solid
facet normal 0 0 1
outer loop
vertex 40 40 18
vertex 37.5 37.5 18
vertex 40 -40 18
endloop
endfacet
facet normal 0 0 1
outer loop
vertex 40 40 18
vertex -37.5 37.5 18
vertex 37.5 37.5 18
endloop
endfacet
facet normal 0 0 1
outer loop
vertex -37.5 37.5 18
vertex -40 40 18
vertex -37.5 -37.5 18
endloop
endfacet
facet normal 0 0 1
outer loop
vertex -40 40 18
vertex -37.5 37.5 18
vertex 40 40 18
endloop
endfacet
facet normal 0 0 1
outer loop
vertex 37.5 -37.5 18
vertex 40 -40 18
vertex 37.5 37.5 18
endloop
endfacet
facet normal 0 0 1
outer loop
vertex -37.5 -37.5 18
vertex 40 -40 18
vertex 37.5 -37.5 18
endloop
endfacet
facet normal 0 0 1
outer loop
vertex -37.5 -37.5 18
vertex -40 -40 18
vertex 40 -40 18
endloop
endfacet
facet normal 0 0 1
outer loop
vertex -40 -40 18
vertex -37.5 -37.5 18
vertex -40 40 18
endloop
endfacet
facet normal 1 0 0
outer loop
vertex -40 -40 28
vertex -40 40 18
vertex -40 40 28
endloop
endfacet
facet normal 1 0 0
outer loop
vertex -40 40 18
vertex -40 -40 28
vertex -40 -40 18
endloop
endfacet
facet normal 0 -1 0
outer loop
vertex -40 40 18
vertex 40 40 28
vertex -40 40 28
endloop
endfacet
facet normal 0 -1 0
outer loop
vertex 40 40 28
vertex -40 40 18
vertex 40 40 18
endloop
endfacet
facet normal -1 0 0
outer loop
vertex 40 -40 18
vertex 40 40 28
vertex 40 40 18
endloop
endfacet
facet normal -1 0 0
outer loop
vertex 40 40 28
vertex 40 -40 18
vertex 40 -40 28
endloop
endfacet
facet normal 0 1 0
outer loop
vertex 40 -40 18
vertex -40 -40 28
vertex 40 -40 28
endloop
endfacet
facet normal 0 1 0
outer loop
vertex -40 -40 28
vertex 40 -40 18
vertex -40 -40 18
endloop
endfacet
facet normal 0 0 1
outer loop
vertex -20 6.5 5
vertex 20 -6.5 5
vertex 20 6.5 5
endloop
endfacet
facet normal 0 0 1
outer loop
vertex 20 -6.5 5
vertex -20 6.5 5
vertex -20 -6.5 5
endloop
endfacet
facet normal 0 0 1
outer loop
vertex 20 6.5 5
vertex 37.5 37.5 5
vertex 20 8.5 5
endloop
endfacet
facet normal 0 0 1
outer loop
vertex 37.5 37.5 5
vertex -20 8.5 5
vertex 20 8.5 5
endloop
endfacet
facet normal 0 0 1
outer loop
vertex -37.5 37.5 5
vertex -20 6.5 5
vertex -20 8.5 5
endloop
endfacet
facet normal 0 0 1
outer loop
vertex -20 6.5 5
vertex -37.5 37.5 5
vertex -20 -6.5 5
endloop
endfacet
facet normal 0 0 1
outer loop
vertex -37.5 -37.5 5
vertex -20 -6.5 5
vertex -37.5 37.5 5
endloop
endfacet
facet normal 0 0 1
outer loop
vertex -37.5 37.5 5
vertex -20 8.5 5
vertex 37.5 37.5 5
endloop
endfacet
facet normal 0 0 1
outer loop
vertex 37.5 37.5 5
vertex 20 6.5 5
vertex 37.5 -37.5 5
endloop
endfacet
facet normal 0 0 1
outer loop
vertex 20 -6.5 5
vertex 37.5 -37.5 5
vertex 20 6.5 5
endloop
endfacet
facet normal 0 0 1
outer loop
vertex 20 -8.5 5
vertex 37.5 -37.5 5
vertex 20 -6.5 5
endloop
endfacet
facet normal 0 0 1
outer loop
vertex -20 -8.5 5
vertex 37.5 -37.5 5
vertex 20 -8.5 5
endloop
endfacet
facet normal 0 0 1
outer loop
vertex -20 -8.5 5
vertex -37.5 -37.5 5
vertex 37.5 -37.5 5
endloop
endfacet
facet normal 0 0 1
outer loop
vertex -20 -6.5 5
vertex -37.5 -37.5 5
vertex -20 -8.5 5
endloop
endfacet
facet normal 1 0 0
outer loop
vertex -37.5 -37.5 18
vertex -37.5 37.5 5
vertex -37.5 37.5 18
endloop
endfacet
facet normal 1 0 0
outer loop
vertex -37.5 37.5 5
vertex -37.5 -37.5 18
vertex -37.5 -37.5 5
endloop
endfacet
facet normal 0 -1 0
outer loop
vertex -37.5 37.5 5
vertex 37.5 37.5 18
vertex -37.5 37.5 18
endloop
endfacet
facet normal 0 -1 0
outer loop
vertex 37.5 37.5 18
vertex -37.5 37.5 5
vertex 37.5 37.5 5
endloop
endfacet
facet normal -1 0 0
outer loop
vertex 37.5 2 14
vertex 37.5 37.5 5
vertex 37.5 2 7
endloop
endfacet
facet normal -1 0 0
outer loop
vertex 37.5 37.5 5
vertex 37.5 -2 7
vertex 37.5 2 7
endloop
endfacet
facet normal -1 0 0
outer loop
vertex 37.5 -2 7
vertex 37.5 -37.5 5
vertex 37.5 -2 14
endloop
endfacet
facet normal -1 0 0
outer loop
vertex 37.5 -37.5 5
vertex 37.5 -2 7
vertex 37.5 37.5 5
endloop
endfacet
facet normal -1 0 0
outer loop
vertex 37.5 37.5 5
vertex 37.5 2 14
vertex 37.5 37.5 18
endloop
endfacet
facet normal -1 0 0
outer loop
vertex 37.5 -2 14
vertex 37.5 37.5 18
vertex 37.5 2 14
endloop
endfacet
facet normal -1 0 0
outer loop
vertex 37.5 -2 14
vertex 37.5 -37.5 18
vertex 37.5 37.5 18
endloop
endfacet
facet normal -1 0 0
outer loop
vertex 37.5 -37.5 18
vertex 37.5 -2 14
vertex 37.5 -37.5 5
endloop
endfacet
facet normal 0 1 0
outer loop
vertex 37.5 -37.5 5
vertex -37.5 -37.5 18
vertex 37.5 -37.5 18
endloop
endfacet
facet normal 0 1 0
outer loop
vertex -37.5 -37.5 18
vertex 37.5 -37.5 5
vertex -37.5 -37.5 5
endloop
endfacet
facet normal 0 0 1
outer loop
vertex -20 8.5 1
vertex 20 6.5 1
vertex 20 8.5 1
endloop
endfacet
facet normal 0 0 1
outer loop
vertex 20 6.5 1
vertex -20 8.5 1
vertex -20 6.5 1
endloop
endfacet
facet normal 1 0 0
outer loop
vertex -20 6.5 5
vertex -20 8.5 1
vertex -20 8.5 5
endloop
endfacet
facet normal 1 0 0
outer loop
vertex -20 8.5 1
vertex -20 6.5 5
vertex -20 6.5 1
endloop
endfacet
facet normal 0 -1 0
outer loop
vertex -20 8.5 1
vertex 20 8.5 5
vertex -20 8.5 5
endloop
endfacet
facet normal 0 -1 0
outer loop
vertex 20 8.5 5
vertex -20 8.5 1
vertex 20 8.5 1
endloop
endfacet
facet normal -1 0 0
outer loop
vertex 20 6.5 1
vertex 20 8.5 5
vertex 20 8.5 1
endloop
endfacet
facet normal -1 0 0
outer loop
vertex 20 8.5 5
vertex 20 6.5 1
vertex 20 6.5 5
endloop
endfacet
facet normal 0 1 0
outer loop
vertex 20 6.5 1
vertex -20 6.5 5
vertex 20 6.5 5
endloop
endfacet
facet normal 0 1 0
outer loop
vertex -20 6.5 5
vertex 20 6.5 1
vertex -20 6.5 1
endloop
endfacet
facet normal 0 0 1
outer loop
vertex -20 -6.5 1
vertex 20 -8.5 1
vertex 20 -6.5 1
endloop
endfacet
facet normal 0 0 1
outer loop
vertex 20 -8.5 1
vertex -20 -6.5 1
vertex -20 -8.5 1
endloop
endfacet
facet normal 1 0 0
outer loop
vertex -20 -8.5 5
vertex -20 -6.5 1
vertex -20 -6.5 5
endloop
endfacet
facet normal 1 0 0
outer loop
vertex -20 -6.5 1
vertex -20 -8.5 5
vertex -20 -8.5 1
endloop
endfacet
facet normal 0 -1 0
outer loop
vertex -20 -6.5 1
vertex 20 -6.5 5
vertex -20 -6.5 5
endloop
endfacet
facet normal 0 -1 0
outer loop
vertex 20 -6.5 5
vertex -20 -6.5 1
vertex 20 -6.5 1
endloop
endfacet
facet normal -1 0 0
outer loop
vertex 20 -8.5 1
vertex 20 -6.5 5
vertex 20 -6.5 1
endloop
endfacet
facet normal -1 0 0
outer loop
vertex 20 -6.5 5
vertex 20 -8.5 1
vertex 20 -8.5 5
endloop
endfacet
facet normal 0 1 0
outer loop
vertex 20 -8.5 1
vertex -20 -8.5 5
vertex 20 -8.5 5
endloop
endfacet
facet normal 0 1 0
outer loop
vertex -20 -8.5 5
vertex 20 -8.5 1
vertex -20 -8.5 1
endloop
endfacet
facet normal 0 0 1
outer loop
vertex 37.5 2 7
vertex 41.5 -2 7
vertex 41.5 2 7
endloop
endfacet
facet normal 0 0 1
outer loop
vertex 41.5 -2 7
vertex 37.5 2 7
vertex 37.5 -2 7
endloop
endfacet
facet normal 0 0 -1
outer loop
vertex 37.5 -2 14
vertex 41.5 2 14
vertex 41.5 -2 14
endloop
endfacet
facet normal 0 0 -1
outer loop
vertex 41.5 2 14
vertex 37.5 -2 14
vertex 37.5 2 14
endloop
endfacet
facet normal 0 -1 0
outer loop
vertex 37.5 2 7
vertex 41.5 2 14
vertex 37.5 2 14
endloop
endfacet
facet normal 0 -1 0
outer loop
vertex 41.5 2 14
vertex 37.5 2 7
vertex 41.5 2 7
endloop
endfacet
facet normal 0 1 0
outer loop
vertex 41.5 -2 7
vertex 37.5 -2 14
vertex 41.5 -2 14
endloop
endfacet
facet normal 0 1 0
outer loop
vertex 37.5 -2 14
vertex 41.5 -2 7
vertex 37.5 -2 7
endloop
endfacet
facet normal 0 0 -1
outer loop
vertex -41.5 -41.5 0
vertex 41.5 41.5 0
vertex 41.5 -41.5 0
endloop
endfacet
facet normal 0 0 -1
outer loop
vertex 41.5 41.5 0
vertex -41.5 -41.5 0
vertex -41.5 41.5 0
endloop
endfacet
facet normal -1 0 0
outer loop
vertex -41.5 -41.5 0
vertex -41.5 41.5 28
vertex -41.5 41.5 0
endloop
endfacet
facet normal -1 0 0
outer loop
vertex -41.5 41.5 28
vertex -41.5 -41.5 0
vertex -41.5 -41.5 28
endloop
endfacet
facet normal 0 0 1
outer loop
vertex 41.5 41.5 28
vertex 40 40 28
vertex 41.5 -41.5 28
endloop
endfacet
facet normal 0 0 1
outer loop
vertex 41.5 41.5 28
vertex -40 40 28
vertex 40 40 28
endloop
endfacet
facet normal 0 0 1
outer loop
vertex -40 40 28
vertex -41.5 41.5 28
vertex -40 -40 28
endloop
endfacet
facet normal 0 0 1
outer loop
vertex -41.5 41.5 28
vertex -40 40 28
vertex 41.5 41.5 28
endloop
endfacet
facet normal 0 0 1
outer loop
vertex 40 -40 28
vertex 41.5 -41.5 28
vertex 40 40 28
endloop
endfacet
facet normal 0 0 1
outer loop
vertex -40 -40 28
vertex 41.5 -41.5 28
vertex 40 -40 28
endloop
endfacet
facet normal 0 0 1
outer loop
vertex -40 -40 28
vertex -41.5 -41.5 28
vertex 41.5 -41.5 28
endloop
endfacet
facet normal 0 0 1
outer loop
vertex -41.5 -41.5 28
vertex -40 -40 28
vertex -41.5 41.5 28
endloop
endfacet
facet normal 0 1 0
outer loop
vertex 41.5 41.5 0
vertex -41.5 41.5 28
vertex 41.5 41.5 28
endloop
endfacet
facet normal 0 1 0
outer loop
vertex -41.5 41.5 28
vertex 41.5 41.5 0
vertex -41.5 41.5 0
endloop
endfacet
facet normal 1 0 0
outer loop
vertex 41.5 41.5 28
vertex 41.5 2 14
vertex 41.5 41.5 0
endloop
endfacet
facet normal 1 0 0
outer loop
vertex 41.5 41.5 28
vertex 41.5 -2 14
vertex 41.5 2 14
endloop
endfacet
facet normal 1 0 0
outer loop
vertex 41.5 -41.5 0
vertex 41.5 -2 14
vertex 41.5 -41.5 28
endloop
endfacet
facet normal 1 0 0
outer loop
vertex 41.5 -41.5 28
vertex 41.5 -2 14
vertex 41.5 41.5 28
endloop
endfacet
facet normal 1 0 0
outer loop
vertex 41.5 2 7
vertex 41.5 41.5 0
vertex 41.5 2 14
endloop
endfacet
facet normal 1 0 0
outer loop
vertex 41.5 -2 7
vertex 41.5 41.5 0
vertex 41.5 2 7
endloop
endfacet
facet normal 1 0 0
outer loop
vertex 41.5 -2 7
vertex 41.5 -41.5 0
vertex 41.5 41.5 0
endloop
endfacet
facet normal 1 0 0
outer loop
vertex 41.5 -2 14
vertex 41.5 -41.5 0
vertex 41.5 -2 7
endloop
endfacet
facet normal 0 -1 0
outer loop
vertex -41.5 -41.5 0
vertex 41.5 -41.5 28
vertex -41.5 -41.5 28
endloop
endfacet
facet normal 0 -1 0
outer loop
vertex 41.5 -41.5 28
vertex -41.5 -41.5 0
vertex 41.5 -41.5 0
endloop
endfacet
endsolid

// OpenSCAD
edge = 80;
edge_base = 83;
height_base = 18;
indent = 10;

difference(){
    linear_extrude(height = height_base + indent)
        square([edge_base, edge_base], center=true);
    union(){
        translate([0, 0, height_base])
            linear_extrude(height = height_base)
                square([edge, edge], , center=true);
        translate([0, 0, 5])
            linear_extrude(height = height_base)
                square([edge-5, edge-5], , center=true);
        translate([0, 7.5, 1])
            linear_extrude(height = height_base)
                square([40, 2], , center=true);
        translate([0, -7.5, 1])
            linear_extrude(height = height_base)
                square([40, 2], , center=true);
        translate([edge_base / 2, 0, 7])
            linear_extrude(height = 7)
                square([10, 4], , center=true);
    }
}
